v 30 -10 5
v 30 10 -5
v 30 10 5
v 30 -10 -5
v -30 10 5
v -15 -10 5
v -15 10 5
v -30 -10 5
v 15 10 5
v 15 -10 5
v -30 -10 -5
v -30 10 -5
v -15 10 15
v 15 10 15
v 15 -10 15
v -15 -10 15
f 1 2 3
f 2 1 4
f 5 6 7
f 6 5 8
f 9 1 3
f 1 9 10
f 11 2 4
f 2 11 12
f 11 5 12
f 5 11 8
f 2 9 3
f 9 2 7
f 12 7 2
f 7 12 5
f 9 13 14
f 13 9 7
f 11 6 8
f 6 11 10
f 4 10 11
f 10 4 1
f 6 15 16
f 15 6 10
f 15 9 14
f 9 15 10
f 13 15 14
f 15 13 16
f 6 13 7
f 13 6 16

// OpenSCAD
cube([60,20,10], center=true);
translate([0,0,10])
    cube([30,20,10], center=true);
